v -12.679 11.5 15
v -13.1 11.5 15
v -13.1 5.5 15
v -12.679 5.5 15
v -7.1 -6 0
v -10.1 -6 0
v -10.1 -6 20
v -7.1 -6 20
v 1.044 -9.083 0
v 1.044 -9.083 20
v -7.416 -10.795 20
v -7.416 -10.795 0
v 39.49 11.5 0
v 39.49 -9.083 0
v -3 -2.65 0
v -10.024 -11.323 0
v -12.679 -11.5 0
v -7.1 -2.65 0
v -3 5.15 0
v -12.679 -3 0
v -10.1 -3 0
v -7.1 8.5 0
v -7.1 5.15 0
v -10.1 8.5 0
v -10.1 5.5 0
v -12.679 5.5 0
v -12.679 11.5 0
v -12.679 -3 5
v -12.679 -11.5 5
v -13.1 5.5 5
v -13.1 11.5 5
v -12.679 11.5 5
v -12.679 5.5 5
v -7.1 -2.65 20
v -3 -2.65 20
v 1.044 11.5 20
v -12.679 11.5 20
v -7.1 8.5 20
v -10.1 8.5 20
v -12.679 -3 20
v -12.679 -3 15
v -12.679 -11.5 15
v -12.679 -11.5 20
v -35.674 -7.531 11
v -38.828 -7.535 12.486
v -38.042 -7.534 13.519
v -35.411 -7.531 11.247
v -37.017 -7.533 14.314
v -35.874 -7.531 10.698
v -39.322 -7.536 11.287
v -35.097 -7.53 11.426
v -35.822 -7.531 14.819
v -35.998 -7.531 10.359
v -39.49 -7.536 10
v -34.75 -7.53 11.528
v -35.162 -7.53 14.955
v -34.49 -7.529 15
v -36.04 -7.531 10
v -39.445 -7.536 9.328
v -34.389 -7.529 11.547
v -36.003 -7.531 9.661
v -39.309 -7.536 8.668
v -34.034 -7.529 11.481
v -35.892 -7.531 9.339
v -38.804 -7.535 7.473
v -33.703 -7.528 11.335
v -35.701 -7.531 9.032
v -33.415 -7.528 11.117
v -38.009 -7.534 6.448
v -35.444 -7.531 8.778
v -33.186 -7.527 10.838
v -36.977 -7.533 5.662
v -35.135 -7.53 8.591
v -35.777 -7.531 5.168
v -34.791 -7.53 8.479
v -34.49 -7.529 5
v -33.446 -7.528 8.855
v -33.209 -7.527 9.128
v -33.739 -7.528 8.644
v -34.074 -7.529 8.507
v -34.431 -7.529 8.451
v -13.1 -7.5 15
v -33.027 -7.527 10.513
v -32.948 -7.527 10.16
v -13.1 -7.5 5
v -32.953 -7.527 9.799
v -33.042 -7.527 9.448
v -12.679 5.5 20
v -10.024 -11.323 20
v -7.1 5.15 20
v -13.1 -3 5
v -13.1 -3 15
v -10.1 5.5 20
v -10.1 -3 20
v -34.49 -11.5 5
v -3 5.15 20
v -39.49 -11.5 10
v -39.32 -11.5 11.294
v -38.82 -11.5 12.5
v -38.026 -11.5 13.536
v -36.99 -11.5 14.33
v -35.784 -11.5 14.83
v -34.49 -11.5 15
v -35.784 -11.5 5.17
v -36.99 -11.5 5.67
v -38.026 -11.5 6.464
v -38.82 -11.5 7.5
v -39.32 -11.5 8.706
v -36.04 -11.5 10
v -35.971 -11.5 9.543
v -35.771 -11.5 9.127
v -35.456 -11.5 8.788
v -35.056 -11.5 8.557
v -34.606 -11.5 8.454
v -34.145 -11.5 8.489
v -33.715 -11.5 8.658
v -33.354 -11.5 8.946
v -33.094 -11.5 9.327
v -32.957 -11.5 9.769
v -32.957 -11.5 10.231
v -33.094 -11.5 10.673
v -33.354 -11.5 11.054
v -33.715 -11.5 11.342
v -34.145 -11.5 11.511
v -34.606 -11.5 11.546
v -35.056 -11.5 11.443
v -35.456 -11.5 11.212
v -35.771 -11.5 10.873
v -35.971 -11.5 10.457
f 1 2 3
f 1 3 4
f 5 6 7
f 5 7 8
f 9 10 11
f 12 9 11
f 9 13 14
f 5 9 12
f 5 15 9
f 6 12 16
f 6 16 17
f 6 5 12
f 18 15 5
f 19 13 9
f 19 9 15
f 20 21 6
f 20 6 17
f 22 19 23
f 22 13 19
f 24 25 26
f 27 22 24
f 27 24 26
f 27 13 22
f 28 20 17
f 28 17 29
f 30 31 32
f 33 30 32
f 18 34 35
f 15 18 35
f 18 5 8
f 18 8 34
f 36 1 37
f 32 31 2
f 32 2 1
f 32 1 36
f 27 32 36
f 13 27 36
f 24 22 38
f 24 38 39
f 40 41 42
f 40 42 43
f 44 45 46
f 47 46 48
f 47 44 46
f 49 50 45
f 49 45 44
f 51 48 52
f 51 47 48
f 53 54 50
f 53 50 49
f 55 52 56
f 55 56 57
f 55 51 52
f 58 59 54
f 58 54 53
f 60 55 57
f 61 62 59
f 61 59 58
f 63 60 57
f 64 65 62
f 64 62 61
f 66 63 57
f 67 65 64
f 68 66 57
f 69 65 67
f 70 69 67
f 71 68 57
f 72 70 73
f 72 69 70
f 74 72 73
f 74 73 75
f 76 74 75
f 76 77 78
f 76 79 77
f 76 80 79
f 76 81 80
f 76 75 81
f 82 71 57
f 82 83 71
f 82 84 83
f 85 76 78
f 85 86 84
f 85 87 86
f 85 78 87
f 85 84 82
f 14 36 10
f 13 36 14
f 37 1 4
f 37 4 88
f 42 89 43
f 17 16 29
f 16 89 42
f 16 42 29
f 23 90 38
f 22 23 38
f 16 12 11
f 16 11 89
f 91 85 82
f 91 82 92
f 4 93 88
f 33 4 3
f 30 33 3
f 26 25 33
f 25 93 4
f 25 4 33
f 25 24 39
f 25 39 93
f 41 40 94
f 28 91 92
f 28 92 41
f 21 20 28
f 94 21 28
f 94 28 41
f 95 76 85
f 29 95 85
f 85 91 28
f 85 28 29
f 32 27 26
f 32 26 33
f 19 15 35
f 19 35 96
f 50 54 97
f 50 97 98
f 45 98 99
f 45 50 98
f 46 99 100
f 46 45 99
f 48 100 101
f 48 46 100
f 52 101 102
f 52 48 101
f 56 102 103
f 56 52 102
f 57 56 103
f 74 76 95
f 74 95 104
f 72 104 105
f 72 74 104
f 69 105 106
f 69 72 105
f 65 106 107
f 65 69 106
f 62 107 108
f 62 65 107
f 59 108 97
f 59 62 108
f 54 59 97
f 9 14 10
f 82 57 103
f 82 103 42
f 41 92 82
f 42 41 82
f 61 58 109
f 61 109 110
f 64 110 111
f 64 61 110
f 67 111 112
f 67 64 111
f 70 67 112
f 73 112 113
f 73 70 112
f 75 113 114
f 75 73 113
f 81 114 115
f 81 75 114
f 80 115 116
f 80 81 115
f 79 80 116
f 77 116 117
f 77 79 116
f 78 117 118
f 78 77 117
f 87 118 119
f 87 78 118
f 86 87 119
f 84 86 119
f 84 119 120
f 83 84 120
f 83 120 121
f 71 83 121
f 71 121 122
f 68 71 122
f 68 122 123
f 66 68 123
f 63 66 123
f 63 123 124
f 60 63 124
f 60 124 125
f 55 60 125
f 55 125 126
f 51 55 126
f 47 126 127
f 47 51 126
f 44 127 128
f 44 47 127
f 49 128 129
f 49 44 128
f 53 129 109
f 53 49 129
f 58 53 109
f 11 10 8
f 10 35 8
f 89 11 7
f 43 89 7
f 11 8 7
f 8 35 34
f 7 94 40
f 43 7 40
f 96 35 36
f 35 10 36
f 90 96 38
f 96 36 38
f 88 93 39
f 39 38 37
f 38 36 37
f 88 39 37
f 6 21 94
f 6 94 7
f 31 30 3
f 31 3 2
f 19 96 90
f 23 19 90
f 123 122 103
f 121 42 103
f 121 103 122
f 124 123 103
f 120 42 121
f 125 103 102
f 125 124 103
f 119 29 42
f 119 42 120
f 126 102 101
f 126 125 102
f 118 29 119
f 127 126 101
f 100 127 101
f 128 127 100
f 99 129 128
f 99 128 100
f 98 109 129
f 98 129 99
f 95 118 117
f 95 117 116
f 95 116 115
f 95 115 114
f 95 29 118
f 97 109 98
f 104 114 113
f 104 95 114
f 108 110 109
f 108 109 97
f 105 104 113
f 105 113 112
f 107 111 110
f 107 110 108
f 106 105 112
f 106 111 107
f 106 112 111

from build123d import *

# Parameters (mm, degrees)
EXTRUDE_1_DEPTH          = 20
CUT_EXTRUDE_1_DEPTH      = 49.817301935
CUT_EXTRUDE_1_DEPTH_BACK = 49.817301935
CUT_EXTRUDE_2_DEPTH      = 50.88447801
CUT_EXTRUDE_2_DEPTH_BACK = 50.88447801
SKETCH_3_W               = 26.81134726
SKETCH_3_H               = 5
CUT_EXTRUDE_3_DEPTH      = 50.88447801
CUT_EXTRUDE_3_DEPTH_BACK = 50.88447801
CUT_EXTRUDE_4_DEPTH      = 50.88447801
CUT_EXTRUDE_4_DEPTH_BACK = 50.88447801
SKETCH_5_R               = 1.55


with BuildPart() as part:
    # 草图1 → 凸台-拉伸1 (new body)
    with BuildSketch(Plane.XY):
        Polygon((-13.100304314, 11.5), (39.490013248, 11.5), (39.490013248, -9.083192704), (1.044300056, -9.083192704), (-7.416317872, -10.795276425), (-10.024002967, -11.323036202), (-12.678665988, -11.5), (-39.490013248, -11.5), (-39.490013248, -7.536083067), (-13.100304314, -7.5), (-13.100304314, -3), (-10.100304314, -3), (-10.100304314, -6), (-7.100304314, -6), (-7.100304314, -2.65), (-3.000304314, -2.65), (-3.000304314, 5.15), (-7.100304314, 5.15), (-7.100304314, 8.5), (-10.100304314, 8.5), (-10.100304314, 5.5), (-13.100304314, 5.5), align=None)
    extrude(amount=EXTRUDE_1_DEPTH)

    # 草图2 → 切除-拉伸1 (cut, two sides: drawn at the far end of the back side and taken through both)
    with BuildSketch(Plane.XZ.offset(9.083192704).offset(-CUT_EXTRUDE_1_DEPTH_BACK)):
        Polygon((1.044300056, 20), (39.490013248, 0), (39.490013248, 20), align=None)
    extrude(amount=CUT_EXTRUDE_1_DEPTH + CUT_EXTRUDE_1_DEPTH_BACK, mode=Mode.SUBTRACT)

    # 草图3 → 切除-拉伸2 (cut, two sides: drawn at the far end of the back side and taken through both)
    with BuildSketch(Plane.XZ.offset(11.5).offset(-CUT_EXTRUDE_2_DEPTH_BACK)):
        with Locations((-26.084339618, 17.5)):
            Rectangle(SKETCH_3_W, SKETCH_3_H)
        with Locations((-26.084339618, 2.5)):
            Rectangle(SKETCH_3_W, SKETCH_3_H)
    extrude(amount=CUT_EXTRUDE_2_DEPTH + CUT_EXTRUDE_2_DEPTH_BACK, mode=Mode.SUBTRACT)

    # 草图4 → 切除-拉伸3 (cut, two sides: drawn at the far end of the back side and taken through both)
    with BuildSketch(Plane.XZ.offset(11.5).offset(-CUT_EXTRUDE_3_DEPTH_BACK)):
        with BuildLine():
            ThreePointArc((-39.490013248, 10), (-38.025547154, 13.535533906), (-34.490013248, 15))
            Line((-34.490013248, 15), (-39.490013248, 15))
            Line((-39.490013248, 15), (-39.490013248, 10))
        make_face()
        with BuildLine():
            ThreePointArc((-34.490013248, 5), (-38.025547154, 6.464466094), (-39.490013248, 10))
            Line((-39.490013248, 10), (-39.490013248, 5))
            Line((-39.490013248, 5), (-34.490013248, 5))
        make_face()
    extrude(amount=CUT_EXTRUDE_3_DEPTH + CUT_EXTRUDE_3_DEPTH_BACK, mode=Mode.SUBTRACT)

    # 草图5 → 切除-拉伸4 (cut, two sides: drawn at the far end of the back side and taken through both)
    with BuildSketch(Plane.XZ.offset(11.5).offset(-CUT_EXTRUDE_4_DEPTH_BACK)):
        with Locations(Location((-34.490013248, 10, 0), (0, 0, 180))):
            Circle(SKETCH_5_R)
    extrude(amount=CUT_EXTRUDE_4_DEPTH + CUT_EXTRUDE_4_DEPTH_BACK, mode=Mode.SUBTRACT)


solid = part.part
